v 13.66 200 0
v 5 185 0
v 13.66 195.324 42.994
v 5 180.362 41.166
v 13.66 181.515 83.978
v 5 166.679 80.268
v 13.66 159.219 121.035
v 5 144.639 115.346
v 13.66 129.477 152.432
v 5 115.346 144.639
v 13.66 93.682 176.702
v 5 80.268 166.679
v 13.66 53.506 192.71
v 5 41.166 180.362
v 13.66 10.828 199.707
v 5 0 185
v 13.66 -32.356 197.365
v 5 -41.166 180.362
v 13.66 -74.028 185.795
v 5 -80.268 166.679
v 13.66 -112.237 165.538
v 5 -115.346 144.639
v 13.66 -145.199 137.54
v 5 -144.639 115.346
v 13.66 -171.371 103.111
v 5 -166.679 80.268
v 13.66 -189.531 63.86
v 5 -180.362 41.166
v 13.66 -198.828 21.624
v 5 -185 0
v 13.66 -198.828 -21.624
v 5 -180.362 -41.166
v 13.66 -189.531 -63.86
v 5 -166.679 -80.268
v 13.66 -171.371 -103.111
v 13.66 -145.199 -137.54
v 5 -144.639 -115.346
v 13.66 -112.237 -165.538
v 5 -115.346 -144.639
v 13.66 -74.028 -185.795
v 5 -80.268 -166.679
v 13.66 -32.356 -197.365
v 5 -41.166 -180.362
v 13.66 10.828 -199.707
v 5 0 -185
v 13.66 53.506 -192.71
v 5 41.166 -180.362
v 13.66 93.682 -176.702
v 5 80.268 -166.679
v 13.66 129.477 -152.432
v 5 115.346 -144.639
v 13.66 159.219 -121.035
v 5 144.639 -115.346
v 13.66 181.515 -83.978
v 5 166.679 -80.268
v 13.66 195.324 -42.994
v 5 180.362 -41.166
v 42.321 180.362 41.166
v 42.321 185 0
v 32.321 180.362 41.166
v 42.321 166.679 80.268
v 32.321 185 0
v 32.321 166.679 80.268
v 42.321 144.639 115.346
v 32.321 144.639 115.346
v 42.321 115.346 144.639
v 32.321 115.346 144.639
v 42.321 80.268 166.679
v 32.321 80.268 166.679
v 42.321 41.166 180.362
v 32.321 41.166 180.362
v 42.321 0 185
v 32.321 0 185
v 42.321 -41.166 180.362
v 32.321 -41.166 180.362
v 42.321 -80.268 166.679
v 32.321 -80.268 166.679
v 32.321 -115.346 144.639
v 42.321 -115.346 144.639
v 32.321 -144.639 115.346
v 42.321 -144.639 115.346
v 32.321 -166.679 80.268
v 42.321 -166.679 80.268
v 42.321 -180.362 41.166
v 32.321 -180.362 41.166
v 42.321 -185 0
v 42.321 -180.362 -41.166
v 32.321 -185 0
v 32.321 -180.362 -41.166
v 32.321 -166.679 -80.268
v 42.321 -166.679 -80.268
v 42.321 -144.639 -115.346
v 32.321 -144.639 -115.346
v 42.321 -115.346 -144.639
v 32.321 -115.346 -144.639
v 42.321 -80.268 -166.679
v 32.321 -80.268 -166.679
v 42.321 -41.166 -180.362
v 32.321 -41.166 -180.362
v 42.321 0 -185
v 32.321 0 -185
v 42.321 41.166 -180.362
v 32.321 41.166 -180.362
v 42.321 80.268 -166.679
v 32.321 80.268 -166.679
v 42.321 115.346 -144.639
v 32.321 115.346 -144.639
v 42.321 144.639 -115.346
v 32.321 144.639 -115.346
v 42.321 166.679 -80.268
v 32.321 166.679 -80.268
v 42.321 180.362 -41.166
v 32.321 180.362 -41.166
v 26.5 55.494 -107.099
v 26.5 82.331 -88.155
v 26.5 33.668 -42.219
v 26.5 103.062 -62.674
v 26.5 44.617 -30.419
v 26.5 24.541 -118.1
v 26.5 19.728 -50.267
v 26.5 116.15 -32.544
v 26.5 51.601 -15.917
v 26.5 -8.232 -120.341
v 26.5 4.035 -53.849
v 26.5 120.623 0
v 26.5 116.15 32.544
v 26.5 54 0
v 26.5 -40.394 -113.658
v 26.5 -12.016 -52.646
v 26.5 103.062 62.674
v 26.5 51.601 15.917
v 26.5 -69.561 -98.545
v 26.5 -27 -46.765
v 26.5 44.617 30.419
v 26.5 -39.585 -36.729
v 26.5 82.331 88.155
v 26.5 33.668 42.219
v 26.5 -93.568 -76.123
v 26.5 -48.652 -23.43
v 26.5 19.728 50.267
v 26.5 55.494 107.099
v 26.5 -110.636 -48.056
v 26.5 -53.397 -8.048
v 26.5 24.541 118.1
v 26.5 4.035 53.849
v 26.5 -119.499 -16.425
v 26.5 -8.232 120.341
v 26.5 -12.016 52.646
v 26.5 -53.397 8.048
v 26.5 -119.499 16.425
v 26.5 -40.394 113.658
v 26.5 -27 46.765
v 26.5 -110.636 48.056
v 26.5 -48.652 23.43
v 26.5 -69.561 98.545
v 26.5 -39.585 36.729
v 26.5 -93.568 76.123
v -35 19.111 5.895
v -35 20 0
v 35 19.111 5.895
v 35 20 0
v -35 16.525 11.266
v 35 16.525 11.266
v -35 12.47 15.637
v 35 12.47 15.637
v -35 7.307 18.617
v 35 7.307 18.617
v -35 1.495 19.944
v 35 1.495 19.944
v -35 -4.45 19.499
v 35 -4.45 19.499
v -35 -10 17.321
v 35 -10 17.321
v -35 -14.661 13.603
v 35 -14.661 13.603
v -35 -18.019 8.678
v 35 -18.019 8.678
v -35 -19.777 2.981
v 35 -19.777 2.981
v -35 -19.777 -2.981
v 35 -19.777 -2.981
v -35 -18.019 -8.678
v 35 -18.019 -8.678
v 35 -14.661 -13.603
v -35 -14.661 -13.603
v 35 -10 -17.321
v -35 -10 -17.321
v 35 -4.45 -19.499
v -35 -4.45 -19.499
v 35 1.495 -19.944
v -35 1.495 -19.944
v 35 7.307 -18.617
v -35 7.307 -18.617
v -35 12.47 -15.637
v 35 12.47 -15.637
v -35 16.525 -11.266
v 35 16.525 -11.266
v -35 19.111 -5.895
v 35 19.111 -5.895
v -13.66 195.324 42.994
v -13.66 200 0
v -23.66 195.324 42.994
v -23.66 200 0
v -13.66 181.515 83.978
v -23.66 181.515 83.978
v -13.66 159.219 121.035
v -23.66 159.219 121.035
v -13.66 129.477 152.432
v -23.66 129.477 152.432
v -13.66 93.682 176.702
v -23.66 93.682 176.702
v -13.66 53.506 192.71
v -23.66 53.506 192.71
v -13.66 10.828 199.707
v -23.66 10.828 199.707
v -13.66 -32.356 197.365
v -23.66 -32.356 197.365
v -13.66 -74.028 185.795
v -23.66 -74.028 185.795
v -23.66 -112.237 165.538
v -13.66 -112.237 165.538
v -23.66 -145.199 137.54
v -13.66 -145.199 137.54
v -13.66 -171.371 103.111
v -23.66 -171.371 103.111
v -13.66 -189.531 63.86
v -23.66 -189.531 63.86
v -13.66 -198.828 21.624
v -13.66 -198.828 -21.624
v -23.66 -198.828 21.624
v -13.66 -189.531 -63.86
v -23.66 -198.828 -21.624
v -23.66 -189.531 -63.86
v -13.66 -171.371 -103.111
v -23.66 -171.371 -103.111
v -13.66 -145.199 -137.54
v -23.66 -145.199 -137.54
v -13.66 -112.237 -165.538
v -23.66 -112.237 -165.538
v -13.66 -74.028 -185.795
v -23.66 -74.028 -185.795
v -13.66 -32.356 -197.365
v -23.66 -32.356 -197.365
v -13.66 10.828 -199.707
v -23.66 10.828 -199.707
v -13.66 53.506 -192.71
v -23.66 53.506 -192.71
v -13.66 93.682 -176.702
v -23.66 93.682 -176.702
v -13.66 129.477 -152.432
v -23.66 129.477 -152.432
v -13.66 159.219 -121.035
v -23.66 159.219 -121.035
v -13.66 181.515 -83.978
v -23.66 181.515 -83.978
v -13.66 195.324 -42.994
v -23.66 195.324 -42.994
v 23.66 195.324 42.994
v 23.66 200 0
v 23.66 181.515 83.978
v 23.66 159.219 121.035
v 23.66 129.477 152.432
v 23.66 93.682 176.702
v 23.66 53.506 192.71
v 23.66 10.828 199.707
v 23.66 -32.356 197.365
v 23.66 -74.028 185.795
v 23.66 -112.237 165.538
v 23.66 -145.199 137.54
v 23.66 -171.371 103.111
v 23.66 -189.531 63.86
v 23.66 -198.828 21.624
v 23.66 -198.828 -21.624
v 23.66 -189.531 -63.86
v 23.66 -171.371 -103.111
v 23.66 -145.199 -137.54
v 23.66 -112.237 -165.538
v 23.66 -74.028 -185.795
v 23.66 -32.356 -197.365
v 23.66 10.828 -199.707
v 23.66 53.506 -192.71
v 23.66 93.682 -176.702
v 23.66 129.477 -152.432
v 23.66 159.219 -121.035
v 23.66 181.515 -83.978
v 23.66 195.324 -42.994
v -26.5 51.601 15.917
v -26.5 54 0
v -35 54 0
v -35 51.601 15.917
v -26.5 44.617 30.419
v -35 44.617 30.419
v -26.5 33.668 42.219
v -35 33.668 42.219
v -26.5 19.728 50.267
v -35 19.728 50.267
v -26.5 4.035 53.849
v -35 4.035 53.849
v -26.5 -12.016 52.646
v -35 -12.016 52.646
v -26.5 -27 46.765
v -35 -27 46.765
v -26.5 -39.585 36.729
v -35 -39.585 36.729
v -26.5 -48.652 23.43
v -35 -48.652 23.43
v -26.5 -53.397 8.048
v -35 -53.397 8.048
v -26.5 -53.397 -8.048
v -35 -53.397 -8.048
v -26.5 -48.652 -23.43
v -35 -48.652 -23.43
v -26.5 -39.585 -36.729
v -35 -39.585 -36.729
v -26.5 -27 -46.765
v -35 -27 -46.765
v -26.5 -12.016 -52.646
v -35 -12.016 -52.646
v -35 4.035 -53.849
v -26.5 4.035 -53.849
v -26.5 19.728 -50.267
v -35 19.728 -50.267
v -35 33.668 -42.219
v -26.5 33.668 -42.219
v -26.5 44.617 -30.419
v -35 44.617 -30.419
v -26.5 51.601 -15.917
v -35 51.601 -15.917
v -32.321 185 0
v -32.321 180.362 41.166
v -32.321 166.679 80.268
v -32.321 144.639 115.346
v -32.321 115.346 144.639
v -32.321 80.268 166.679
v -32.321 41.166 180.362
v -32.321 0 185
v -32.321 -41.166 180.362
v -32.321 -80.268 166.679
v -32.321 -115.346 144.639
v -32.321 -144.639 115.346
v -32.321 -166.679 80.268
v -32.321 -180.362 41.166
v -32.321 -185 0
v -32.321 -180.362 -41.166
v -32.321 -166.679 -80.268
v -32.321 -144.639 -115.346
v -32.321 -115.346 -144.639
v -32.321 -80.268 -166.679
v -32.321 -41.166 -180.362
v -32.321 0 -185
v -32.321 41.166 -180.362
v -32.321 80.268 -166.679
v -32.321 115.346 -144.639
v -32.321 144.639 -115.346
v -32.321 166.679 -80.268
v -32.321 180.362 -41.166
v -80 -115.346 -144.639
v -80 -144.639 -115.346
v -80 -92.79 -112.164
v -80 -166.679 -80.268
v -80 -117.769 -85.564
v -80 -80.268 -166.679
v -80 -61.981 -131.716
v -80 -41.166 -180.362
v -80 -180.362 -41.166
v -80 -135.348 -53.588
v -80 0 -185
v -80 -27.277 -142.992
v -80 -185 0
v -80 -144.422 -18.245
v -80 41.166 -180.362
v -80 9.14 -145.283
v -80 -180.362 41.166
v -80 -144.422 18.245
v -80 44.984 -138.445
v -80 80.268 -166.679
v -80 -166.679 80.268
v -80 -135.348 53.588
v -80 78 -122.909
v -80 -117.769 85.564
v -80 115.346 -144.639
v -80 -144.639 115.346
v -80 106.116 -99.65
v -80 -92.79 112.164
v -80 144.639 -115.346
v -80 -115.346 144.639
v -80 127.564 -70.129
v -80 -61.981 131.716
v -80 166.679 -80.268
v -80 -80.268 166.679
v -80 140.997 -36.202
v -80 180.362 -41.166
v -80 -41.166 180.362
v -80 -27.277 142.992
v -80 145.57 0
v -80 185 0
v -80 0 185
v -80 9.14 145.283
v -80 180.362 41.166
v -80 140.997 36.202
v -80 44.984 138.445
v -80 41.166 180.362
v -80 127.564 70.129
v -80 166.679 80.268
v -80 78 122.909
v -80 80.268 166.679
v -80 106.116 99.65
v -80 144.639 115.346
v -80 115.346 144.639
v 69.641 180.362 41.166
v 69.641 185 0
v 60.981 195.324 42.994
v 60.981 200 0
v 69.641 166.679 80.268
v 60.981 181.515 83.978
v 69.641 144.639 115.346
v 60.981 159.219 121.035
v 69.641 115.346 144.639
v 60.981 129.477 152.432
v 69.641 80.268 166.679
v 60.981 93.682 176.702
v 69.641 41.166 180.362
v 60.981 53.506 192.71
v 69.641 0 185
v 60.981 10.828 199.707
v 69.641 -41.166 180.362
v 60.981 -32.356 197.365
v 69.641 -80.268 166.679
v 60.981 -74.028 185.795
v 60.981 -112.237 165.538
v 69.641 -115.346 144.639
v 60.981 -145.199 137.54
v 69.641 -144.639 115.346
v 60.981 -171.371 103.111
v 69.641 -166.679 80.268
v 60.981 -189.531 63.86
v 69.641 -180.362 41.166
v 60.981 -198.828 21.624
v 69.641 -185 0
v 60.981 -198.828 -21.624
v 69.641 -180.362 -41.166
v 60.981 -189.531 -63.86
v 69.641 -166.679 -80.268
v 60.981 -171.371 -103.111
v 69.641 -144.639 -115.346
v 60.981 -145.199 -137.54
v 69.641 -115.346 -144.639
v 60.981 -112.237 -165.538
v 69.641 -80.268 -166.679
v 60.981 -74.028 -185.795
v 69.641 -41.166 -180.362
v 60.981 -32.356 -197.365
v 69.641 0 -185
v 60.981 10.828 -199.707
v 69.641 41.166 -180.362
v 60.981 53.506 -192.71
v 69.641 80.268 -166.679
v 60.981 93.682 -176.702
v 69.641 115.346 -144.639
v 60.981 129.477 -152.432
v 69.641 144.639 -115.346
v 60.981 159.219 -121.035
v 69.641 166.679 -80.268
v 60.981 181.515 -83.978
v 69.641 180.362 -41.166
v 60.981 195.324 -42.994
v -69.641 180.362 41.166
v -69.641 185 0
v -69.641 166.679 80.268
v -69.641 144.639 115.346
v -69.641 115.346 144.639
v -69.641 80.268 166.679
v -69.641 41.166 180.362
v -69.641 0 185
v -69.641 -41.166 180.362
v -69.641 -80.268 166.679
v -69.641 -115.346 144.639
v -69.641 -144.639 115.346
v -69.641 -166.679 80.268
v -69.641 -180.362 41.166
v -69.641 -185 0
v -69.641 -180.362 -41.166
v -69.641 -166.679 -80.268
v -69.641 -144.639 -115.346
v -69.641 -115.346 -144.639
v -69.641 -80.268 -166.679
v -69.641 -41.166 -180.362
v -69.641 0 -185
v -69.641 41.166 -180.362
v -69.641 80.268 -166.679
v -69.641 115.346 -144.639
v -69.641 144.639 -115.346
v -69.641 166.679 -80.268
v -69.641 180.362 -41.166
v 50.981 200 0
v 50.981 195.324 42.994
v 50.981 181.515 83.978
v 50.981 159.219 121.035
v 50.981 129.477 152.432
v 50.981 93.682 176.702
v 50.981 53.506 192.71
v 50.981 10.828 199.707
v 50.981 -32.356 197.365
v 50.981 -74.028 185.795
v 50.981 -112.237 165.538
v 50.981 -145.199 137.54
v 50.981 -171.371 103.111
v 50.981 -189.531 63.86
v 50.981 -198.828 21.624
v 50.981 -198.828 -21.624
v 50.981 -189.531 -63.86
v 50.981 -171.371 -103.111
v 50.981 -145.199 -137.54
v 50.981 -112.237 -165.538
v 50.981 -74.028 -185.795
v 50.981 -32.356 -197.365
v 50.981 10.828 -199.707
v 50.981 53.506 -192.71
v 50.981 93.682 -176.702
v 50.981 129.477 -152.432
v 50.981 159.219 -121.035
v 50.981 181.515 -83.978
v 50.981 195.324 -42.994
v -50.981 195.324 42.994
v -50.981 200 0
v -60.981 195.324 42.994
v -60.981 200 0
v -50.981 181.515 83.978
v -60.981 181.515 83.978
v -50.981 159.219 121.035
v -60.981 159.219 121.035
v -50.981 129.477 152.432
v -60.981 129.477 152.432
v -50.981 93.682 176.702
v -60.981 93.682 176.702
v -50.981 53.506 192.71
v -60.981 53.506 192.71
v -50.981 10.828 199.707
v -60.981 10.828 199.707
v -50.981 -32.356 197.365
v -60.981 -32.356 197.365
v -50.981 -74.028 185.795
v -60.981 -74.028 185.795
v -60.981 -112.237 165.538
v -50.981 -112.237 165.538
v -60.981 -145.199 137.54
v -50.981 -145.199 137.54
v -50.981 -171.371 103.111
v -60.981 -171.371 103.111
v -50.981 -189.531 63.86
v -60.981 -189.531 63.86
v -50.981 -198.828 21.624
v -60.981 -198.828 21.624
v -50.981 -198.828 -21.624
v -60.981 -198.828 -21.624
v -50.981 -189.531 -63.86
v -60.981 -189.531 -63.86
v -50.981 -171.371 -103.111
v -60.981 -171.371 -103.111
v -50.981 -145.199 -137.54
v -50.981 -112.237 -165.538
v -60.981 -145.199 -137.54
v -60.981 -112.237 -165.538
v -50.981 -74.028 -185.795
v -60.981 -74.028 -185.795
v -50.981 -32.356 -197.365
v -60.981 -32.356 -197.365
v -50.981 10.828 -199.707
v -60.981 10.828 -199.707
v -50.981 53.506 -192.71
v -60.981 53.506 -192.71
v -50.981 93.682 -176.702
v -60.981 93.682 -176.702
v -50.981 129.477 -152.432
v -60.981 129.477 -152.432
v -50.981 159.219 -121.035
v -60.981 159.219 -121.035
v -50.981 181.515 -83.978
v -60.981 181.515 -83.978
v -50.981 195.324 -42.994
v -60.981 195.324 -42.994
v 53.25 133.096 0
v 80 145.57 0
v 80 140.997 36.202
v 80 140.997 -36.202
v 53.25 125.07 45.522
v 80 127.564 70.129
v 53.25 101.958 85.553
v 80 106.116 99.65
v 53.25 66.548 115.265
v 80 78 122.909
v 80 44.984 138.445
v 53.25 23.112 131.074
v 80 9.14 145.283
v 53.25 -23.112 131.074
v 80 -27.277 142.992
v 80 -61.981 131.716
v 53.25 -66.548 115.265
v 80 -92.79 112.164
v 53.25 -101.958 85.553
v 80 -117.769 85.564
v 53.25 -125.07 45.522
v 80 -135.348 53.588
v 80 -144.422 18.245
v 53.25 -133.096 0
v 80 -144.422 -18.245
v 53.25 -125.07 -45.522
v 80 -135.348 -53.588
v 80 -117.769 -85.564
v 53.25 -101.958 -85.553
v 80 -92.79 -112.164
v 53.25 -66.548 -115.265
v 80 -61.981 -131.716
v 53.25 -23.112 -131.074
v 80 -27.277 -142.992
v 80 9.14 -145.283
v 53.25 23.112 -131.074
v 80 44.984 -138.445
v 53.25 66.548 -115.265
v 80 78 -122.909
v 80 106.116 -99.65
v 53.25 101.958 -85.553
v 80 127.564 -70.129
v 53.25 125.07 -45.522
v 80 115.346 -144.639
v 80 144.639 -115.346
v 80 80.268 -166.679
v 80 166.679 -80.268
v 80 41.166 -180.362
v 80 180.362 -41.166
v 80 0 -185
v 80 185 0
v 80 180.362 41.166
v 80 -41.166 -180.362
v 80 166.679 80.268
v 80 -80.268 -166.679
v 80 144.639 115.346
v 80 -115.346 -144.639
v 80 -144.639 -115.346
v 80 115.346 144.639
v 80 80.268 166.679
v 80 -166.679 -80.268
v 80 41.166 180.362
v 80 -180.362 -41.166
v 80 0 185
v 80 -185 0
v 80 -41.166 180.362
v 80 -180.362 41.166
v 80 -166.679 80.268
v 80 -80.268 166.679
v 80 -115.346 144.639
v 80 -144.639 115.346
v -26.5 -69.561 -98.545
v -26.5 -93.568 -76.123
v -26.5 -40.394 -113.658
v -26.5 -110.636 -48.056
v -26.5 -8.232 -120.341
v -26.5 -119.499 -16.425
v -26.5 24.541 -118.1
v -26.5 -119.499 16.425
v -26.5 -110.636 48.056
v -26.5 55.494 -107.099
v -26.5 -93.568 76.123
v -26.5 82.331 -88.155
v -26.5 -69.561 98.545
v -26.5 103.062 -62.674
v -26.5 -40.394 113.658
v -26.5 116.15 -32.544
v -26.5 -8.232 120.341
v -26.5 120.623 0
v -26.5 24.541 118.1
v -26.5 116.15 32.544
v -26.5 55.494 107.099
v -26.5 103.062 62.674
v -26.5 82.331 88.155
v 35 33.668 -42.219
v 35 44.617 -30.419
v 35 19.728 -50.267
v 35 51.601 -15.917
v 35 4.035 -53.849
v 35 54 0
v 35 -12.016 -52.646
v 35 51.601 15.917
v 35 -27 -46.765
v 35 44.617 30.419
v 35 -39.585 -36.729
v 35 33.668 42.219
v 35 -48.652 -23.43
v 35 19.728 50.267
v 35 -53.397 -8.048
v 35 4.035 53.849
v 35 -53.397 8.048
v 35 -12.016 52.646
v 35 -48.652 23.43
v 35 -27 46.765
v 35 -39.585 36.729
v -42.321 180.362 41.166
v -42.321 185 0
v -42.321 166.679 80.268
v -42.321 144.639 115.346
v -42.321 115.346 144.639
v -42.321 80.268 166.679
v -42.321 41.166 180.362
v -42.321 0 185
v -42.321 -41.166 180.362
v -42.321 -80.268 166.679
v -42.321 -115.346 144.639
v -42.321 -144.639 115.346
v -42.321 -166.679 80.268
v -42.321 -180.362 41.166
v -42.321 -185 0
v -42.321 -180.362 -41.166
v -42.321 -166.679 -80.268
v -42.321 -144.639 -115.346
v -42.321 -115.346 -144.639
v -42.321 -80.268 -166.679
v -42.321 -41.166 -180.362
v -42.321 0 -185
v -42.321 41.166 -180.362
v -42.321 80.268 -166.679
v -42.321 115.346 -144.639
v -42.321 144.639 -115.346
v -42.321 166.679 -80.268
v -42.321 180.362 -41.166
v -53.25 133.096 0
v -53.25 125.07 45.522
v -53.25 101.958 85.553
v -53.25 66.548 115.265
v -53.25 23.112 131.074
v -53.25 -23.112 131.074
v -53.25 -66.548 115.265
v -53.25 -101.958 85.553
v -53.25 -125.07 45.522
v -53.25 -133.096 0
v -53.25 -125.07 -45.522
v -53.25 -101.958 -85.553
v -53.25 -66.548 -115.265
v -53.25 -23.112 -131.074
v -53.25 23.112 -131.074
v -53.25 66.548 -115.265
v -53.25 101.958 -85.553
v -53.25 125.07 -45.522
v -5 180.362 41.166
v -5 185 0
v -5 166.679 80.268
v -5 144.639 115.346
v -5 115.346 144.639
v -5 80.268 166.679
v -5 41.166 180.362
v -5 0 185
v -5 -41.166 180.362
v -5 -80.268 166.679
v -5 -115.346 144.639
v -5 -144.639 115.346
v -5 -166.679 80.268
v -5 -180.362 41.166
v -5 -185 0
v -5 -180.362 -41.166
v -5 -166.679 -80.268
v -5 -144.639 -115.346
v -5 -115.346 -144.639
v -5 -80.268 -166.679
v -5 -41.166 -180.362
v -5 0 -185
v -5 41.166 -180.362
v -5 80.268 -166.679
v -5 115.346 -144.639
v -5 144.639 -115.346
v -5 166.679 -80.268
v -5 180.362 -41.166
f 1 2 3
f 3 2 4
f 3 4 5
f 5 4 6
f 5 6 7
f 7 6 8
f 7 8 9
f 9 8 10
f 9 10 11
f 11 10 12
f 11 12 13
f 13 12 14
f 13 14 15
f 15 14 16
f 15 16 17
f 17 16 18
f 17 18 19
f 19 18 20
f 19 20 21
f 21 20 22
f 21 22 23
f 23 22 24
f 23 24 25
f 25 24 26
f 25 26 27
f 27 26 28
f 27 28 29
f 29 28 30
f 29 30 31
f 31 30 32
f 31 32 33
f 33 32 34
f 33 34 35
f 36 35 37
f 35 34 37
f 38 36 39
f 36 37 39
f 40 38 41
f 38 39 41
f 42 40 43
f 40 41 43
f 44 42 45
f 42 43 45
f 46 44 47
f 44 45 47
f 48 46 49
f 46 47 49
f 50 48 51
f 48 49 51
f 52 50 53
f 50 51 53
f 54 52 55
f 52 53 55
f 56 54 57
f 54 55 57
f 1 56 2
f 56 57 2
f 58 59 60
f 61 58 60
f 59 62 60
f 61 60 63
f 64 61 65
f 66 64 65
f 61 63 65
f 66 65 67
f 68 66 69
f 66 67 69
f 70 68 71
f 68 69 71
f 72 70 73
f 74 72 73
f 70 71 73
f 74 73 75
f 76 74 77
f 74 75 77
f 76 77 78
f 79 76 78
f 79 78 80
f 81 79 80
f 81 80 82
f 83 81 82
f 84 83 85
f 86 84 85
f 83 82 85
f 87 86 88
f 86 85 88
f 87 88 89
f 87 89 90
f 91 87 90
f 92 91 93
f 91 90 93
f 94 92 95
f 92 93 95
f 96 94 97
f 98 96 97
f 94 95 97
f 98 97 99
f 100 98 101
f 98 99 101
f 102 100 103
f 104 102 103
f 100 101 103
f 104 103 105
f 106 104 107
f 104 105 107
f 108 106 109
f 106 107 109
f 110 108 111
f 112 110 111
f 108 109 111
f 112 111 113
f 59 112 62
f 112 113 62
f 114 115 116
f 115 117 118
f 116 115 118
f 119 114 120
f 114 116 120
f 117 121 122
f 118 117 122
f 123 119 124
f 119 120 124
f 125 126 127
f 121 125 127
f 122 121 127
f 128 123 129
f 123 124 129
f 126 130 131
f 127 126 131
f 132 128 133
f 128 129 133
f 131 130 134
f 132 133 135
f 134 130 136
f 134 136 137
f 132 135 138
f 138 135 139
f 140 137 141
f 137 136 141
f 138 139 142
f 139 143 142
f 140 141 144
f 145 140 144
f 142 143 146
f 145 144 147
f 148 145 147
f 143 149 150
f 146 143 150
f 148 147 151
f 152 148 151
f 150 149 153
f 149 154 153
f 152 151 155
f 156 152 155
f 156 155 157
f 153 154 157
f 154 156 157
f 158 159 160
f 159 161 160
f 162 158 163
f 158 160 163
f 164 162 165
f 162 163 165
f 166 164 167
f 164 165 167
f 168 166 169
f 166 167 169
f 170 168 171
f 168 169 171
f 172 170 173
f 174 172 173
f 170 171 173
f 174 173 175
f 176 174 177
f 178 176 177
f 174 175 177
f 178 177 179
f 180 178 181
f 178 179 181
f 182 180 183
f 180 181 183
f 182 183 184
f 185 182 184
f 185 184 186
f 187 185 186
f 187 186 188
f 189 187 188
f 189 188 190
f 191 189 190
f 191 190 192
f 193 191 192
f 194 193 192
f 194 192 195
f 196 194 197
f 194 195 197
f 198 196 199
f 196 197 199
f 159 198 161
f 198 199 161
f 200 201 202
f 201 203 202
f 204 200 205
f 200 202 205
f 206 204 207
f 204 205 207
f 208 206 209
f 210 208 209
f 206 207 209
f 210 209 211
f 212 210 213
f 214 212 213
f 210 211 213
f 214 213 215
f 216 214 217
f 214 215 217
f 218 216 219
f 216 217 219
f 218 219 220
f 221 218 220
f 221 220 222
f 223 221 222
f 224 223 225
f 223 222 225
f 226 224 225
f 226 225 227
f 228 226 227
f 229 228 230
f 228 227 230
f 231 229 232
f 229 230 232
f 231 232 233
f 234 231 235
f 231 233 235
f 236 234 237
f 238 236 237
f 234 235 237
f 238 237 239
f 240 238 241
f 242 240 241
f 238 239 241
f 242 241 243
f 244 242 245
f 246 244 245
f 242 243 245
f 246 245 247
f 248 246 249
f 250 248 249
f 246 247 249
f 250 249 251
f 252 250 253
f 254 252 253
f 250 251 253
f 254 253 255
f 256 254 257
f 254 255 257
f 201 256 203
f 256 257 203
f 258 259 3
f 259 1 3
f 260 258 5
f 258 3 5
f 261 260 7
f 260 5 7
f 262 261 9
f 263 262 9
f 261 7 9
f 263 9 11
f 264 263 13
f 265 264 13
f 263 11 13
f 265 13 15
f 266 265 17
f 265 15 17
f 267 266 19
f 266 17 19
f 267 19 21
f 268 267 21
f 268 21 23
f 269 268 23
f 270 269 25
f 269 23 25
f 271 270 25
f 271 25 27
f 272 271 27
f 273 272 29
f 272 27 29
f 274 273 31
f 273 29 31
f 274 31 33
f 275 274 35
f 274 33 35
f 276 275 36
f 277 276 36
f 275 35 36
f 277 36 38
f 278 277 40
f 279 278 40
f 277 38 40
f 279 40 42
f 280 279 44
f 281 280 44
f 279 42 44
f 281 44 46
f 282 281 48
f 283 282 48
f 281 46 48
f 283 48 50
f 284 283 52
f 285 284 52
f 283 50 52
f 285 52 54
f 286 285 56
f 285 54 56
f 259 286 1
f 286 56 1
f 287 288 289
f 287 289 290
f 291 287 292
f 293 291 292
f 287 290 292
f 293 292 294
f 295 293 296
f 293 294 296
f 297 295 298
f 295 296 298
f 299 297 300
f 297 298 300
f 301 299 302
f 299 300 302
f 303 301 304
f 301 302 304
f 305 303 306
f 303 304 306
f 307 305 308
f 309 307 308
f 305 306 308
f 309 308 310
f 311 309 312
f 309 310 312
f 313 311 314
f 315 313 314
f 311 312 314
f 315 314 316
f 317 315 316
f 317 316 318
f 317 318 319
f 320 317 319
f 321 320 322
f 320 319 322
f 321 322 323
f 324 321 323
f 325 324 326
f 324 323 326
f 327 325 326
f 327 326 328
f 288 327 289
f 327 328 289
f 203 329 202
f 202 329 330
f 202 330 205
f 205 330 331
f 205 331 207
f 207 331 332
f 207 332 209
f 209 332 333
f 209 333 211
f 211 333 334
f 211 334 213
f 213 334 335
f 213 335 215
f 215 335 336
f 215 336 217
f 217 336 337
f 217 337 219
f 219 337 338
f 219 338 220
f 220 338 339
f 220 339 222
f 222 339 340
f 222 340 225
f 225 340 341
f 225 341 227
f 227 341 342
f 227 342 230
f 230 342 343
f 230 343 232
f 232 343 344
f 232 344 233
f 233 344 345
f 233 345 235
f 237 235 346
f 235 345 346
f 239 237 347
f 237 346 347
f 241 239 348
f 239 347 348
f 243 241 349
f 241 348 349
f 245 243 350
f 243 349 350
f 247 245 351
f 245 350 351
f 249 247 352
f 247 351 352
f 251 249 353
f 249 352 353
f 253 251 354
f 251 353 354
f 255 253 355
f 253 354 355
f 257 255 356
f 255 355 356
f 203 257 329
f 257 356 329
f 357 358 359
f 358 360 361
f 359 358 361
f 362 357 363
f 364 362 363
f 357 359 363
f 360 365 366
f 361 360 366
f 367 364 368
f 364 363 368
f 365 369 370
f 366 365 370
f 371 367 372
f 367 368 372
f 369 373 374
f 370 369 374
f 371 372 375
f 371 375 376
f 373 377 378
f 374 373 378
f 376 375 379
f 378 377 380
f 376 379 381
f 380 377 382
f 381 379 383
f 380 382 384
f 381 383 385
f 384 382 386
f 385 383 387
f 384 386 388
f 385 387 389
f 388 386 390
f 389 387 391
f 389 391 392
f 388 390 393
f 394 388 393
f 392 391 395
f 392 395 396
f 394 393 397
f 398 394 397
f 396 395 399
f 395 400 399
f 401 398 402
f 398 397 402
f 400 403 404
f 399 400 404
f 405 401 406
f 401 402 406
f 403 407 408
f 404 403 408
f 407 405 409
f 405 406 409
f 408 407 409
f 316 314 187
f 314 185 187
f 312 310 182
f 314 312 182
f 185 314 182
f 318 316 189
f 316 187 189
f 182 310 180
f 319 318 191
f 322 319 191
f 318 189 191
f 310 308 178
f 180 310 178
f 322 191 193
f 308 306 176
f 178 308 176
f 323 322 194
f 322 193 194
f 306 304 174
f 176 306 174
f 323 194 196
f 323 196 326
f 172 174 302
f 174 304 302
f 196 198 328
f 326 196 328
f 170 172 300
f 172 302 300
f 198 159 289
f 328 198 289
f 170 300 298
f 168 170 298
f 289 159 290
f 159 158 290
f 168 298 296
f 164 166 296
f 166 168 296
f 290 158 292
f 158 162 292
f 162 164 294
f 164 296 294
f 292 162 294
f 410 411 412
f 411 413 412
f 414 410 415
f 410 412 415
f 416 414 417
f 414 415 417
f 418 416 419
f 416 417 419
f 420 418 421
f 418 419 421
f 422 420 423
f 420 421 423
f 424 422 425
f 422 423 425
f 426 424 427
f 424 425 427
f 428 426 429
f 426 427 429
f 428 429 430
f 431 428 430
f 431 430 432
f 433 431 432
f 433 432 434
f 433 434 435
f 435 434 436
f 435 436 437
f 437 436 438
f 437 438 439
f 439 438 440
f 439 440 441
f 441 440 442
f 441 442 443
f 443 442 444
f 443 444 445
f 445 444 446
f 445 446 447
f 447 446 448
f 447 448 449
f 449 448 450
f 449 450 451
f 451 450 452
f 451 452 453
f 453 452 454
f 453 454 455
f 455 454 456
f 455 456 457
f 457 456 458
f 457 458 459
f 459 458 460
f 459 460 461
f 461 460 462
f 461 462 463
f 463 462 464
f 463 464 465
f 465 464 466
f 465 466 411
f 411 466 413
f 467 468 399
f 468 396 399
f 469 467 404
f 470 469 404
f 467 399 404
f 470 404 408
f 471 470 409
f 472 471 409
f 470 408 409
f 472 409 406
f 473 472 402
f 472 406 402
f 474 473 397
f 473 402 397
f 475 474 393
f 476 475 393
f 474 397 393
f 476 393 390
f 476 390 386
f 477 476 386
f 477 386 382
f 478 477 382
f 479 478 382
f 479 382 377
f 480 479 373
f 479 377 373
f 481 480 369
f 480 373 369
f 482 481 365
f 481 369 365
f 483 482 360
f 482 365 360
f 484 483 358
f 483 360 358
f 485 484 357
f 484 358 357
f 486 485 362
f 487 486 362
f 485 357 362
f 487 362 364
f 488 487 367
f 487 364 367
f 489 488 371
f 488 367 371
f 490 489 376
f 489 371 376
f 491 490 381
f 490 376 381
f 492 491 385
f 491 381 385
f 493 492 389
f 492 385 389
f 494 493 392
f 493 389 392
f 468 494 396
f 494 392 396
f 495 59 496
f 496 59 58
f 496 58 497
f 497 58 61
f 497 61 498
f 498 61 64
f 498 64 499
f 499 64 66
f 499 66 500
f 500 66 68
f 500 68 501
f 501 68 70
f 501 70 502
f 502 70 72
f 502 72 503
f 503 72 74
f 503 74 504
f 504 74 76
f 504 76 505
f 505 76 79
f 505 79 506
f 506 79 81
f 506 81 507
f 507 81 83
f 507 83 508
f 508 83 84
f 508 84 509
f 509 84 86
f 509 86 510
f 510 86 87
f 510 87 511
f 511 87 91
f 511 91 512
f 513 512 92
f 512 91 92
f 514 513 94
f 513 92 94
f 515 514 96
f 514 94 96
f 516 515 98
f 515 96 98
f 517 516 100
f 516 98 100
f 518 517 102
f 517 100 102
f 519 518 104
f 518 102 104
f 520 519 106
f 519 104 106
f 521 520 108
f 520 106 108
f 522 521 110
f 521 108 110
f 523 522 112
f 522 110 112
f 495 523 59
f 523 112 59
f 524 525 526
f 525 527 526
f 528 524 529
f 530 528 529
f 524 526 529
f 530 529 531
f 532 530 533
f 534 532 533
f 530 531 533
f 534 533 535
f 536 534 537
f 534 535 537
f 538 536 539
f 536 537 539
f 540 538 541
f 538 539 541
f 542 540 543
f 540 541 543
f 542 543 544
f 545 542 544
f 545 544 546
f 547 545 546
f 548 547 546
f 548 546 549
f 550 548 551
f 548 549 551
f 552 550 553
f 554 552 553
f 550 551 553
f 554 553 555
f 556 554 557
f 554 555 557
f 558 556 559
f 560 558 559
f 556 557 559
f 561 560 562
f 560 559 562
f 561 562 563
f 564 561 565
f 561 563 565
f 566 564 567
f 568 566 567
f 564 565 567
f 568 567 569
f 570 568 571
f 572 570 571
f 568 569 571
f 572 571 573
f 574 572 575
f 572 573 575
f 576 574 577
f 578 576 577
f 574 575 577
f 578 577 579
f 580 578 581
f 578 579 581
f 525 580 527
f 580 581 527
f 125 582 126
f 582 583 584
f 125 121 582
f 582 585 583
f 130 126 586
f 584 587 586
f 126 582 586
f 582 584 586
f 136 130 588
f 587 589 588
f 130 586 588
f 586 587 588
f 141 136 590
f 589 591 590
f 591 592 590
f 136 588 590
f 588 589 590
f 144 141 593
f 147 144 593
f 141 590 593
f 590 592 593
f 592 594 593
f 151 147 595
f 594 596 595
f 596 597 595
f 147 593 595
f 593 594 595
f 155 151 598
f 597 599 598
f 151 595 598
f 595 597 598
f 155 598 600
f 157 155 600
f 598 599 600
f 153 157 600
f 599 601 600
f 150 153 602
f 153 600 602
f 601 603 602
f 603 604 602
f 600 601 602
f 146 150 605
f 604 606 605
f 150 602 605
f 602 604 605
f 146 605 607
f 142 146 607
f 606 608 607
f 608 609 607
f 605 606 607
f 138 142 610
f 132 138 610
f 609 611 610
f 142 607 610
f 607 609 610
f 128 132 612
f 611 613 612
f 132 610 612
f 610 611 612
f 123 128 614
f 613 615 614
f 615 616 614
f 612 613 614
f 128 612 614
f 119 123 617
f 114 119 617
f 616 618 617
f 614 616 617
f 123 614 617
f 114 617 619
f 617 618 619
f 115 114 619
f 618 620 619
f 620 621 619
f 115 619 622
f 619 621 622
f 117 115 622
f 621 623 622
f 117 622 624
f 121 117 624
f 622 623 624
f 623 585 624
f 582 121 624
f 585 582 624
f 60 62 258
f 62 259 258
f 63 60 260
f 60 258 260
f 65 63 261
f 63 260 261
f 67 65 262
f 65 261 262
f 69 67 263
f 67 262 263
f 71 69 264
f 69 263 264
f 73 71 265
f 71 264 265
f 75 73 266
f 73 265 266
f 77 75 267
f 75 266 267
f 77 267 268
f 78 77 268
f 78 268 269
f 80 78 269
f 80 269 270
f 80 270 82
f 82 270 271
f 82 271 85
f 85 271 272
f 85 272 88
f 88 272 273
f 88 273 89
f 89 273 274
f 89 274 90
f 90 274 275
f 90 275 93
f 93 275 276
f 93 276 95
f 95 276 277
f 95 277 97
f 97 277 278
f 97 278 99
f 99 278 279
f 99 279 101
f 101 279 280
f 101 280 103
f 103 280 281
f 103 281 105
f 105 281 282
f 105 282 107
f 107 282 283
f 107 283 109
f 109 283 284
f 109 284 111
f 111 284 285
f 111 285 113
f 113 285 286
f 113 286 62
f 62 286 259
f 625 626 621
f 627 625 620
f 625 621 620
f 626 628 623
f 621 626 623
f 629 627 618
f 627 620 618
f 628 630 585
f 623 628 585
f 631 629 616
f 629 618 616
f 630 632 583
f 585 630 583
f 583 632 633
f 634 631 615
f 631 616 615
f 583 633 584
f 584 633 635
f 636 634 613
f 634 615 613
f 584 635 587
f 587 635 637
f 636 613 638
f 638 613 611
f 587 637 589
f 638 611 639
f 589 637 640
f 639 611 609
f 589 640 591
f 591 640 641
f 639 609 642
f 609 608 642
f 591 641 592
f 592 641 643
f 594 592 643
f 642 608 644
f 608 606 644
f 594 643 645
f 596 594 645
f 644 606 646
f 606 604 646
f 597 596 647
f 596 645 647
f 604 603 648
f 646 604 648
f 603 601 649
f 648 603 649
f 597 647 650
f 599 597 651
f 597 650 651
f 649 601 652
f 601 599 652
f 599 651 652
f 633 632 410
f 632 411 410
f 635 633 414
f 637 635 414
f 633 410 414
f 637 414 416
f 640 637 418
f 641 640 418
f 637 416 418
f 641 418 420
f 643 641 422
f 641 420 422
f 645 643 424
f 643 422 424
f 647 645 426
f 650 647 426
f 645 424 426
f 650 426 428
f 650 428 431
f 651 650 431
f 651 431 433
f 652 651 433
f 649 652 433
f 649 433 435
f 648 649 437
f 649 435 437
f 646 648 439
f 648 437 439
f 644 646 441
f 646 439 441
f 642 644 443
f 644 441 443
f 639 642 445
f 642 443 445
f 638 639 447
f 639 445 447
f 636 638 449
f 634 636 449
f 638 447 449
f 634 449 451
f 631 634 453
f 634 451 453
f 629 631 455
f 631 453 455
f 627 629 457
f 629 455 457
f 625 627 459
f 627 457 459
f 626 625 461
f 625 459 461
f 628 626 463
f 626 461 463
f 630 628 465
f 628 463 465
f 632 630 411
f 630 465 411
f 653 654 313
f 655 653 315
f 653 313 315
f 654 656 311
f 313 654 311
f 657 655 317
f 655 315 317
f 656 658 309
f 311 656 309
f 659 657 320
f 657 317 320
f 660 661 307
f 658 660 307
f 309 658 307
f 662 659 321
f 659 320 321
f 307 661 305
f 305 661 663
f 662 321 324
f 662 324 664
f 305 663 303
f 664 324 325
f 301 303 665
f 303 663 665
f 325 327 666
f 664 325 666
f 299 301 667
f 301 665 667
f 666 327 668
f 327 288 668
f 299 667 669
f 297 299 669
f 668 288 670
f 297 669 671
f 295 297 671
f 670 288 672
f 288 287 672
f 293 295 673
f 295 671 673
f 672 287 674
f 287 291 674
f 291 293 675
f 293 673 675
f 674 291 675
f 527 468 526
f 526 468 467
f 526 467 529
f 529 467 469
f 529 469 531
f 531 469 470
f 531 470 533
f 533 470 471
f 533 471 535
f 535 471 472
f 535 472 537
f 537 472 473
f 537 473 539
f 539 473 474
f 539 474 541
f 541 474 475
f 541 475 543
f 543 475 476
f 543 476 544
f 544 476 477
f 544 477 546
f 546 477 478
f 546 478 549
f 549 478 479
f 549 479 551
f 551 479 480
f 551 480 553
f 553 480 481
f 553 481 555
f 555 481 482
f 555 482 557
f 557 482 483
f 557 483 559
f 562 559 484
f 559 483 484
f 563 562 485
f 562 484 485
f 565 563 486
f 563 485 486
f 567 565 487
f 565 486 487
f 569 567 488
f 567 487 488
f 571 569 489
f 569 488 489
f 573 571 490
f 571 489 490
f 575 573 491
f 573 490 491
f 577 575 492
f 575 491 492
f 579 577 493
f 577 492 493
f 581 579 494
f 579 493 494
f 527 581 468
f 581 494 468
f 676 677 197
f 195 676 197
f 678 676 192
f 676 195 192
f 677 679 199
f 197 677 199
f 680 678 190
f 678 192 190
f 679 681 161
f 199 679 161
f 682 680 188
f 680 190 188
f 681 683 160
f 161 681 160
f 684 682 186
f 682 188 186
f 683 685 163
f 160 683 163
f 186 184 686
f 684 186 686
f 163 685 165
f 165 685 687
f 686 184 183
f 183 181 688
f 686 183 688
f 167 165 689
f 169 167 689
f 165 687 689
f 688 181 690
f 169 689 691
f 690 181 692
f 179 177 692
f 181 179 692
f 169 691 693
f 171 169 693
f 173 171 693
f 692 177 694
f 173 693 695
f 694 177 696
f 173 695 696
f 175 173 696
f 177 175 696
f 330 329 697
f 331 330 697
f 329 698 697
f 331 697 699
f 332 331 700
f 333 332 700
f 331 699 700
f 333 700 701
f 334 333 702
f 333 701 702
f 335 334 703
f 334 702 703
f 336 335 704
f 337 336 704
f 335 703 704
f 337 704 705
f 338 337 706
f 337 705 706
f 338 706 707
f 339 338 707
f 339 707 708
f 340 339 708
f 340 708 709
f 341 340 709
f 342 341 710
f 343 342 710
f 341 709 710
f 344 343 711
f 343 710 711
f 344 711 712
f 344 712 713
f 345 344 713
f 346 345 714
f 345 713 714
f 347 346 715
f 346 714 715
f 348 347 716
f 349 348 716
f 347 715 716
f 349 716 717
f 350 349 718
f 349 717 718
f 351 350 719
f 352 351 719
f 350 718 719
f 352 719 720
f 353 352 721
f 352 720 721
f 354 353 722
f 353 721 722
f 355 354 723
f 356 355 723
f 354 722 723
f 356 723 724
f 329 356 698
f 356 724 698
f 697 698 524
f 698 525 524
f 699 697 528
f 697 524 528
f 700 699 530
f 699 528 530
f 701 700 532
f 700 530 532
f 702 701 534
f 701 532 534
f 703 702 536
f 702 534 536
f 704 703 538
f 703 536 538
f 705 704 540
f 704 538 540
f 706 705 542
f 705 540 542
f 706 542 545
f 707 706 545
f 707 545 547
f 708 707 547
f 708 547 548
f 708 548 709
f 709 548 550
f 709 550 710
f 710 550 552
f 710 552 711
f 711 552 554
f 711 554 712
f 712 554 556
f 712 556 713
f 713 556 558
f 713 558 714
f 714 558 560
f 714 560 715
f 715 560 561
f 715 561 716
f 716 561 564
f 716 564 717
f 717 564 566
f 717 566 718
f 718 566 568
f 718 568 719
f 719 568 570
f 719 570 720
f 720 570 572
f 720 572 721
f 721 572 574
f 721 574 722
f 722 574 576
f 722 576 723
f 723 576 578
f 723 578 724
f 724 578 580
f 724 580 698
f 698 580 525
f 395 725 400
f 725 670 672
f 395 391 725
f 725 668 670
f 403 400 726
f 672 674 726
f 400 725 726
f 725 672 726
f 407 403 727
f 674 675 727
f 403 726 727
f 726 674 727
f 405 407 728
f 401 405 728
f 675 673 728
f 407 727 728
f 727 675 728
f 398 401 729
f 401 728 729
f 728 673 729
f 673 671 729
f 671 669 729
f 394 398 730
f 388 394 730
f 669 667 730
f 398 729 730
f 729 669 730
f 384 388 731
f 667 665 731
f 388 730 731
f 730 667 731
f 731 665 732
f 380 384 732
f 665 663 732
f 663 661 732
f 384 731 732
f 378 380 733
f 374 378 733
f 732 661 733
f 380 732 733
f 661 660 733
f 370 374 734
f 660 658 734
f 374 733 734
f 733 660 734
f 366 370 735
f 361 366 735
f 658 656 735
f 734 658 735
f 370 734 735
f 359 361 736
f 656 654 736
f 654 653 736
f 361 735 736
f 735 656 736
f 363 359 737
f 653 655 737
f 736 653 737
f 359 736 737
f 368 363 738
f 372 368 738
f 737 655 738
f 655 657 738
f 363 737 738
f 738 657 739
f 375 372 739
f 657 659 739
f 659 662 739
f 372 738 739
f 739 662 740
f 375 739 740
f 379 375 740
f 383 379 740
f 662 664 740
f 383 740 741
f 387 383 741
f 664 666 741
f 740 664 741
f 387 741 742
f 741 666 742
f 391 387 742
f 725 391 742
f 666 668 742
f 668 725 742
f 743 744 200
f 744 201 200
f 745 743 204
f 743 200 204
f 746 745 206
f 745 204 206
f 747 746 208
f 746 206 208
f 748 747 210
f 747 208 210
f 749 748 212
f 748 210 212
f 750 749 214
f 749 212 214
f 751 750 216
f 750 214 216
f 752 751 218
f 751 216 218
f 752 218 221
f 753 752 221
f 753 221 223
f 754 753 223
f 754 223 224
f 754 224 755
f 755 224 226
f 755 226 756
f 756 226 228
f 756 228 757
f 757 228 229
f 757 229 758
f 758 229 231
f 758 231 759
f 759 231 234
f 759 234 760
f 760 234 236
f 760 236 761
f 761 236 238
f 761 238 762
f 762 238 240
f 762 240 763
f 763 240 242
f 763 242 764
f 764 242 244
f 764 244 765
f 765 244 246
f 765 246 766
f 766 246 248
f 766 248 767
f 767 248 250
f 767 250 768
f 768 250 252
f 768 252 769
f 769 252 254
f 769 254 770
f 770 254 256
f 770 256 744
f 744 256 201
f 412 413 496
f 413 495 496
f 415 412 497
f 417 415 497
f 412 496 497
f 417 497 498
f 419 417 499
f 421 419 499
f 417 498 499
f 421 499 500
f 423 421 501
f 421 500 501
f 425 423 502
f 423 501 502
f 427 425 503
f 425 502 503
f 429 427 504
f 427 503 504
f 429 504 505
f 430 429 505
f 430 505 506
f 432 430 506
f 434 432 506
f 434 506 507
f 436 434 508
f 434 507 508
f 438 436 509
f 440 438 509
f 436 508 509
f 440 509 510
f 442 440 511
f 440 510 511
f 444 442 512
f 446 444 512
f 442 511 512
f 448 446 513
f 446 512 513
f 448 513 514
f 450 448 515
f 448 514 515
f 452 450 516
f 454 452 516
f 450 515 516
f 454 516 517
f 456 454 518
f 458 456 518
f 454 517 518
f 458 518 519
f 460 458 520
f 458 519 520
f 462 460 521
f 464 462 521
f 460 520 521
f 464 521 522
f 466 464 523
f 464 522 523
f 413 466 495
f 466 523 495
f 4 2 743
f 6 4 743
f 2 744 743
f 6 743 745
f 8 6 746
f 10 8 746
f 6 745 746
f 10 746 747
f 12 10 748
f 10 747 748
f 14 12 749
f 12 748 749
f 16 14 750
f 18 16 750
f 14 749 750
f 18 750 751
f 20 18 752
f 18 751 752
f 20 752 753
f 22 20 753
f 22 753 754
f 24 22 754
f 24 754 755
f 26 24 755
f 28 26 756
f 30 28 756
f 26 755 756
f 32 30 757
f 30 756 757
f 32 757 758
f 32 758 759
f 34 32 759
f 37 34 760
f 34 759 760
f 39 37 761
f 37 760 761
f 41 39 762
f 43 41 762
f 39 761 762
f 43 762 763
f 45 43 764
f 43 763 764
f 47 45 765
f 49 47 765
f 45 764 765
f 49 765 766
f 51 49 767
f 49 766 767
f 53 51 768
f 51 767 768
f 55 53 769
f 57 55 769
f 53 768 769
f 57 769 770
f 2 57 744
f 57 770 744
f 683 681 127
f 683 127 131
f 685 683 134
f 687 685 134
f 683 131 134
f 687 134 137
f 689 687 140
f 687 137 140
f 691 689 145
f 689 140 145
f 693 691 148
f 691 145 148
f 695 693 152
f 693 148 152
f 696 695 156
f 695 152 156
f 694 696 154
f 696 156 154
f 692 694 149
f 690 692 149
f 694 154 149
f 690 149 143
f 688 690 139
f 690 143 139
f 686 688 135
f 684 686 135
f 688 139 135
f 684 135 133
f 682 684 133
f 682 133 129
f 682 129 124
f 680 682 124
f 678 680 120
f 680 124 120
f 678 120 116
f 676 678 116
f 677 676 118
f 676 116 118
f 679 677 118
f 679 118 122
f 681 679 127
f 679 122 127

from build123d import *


with BuildPart() as part:
    # Sketch2 → Revolve1 (revolve)
    with BuildSketch(Plane.XY):
        Polygon((-35, 20), (35, 20), (35, 54), (26.5, 54), (26.5, 120.622540289), (80, 145.57), (80, 185), (69.641016151, 185), (60.980762114, 200), (50.980762114, 200), (42.320508076, 185), (32.320508076, 185), (23.660254038, 200), (13.660254038, 200), (5, 185), (-5, 185), (-13.660254038, 200), (-23.660254038, 200), (-32.320508076, 185), (-42.320508076, 185), (-50.980762114, 200), (-60.980762114, 200), (-69.641016151, 185), (-80, 185), (-80, 145.57), (-26.5, 120.622540289), (-26.5, 54), (-35, 54), align=None)
    revolve(axis=Axis((-192.57069662, 0, 0), (1, 0, 0)))


solid = part.part
